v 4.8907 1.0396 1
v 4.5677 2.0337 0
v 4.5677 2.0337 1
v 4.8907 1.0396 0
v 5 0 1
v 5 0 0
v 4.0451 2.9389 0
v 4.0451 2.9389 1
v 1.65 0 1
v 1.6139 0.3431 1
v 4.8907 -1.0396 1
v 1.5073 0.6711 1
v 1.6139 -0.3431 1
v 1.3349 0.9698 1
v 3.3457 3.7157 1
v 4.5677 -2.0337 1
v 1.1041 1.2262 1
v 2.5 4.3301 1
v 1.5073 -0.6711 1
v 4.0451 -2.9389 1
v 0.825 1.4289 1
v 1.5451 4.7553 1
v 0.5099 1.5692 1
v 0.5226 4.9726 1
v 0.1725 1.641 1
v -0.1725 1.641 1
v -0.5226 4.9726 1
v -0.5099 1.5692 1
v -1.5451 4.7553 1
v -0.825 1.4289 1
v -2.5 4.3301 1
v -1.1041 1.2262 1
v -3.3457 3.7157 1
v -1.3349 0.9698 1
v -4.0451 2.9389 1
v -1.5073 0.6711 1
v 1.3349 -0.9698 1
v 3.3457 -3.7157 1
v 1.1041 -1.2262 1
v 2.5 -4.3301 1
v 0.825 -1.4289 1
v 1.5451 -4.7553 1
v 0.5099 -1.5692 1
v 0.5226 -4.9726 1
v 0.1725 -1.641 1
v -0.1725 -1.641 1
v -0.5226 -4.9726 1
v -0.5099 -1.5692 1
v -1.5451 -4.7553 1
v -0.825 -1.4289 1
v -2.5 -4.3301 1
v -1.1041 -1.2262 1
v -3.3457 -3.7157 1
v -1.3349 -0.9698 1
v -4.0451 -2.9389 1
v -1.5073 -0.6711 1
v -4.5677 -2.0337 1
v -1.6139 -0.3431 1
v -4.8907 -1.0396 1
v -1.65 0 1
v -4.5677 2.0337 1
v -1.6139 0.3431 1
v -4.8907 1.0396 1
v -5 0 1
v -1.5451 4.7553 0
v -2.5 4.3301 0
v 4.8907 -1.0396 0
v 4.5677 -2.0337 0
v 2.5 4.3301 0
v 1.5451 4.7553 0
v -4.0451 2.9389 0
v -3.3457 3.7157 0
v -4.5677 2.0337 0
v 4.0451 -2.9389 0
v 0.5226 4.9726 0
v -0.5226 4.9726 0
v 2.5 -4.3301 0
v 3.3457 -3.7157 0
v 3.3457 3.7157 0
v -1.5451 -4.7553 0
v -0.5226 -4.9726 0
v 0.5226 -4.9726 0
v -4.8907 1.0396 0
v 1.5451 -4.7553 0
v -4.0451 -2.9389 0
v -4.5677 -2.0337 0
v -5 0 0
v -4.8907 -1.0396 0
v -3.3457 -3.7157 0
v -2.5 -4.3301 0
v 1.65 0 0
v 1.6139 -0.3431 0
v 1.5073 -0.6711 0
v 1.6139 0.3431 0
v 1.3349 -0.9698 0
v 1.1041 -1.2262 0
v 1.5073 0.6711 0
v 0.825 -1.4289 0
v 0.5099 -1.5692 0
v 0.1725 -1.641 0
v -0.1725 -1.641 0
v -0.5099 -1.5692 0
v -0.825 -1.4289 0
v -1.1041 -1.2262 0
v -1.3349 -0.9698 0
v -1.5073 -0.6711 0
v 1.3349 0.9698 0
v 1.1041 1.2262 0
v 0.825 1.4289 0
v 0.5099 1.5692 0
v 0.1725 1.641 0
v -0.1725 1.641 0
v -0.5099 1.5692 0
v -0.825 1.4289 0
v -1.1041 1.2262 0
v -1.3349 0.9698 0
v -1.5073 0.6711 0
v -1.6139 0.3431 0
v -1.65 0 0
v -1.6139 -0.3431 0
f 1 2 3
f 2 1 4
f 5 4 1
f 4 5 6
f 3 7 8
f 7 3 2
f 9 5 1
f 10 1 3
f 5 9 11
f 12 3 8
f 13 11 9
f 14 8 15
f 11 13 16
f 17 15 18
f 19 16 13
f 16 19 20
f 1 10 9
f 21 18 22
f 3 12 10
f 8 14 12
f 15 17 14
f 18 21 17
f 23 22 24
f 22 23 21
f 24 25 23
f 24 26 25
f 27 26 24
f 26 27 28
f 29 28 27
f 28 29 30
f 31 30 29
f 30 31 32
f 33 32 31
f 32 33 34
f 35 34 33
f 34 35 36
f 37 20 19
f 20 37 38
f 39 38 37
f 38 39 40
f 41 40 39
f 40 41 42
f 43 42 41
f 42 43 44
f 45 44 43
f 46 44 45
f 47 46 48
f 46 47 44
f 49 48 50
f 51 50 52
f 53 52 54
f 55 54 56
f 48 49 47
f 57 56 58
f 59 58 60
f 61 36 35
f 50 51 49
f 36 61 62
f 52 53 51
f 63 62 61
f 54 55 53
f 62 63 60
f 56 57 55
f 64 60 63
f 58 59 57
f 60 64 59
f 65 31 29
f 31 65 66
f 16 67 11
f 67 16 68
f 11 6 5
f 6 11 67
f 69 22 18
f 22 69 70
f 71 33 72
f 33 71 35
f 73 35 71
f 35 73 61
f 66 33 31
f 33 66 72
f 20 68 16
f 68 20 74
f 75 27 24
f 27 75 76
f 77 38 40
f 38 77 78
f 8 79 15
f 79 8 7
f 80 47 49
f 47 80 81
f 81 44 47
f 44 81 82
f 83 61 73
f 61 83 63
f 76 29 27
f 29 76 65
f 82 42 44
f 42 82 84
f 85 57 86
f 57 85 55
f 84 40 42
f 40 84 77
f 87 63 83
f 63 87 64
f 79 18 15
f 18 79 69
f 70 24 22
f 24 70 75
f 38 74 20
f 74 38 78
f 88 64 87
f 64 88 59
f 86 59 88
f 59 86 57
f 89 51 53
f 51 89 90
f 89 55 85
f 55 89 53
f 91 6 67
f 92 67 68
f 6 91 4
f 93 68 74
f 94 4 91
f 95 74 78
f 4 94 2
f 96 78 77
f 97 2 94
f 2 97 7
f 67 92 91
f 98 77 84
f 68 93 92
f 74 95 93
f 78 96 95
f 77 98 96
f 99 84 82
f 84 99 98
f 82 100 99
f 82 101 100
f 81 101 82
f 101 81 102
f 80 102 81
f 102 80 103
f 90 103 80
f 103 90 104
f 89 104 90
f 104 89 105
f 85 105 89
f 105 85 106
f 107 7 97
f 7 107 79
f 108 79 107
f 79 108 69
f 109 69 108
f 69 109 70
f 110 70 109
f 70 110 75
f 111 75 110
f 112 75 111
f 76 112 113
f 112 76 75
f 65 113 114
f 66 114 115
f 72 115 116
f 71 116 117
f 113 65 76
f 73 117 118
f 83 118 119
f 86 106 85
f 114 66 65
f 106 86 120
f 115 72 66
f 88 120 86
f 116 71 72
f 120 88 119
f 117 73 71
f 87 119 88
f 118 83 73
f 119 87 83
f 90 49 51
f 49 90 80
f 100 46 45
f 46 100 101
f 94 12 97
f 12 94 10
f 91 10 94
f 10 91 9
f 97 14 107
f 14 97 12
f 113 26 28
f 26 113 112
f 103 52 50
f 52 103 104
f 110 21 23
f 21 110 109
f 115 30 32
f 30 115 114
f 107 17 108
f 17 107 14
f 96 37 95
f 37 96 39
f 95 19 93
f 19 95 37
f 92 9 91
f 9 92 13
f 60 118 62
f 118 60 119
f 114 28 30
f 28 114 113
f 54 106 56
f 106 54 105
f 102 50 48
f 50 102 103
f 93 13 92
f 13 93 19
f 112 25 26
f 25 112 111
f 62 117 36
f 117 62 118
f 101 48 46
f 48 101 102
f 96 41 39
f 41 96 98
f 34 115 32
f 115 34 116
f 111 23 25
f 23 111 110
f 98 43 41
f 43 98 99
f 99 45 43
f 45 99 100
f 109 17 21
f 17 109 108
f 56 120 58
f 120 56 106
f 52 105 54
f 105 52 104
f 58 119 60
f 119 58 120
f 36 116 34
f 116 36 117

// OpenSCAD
module washer(d1,d2,z){
	difference(){
		cylinder(h=z,r=d1/2);
		cylinder(h=z,r=d2/2);
	}

}

$fs = 0.01;
washer(10,3.3,1);
//cylinder(h=1,r=10);
